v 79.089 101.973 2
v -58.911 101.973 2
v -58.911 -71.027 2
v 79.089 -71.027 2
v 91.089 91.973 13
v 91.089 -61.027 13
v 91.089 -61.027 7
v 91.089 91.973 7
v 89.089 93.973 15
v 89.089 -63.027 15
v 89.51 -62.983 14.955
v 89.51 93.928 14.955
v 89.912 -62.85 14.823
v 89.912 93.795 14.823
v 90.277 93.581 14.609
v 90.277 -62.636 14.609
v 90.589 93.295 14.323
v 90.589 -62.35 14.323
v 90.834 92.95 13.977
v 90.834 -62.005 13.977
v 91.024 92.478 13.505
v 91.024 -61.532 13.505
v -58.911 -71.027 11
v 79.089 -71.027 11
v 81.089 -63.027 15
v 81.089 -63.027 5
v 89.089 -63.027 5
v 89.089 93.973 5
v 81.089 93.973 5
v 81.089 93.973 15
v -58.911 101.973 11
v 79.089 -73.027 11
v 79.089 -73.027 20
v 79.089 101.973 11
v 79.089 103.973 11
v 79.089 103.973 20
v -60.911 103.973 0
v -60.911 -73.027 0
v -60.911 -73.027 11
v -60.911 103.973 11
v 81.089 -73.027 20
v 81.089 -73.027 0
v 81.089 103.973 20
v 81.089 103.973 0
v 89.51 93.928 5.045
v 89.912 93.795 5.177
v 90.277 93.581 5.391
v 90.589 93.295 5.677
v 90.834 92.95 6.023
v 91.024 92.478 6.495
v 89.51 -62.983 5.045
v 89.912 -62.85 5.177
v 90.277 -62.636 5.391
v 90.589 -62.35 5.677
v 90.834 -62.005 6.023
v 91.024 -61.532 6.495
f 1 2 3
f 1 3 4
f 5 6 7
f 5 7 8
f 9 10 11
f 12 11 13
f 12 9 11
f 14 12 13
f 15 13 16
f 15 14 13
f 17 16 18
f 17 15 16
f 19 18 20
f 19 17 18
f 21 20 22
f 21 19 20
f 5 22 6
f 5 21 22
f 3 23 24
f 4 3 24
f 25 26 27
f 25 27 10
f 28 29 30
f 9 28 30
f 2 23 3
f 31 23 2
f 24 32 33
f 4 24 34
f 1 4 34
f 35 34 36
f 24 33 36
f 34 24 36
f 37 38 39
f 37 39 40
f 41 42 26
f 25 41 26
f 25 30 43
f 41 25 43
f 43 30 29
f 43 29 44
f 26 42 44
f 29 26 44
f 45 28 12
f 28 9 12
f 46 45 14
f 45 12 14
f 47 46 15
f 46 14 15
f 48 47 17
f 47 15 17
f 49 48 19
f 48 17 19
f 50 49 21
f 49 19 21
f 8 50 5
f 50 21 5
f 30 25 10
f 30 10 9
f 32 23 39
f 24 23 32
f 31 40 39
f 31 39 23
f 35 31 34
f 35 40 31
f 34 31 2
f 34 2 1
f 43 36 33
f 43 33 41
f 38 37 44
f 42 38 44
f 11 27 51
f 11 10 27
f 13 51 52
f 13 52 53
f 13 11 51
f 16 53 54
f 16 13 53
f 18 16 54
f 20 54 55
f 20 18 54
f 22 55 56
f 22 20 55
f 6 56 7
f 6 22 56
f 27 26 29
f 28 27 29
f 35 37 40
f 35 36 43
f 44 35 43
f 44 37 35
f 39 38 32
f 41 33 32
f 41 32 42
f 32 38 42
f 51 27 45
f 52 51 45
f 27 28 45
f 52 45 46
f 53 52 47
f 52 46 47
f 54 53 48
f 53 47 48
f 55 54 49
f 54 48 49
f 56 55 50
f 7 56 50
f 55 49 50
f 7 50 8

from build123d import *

# Parameters (mm, degrees)
F0_W     = 142
F0_H     = 177
F1_DEPTH = 20
F2_W     = 138
F2_H     = 173
F3_DEPTH = 18
F4_DEPTH = 9
F5_W     = 157
F5_H     = 10
F6_DEPTH = 10
F7_R     = 2


with BuildPart() as f1:
    # F0 (on Top) → F1 (new body)
    with BuildSketch(Plane.XY):
        with Locations((10.088578, 15.472607)):
            Rectangle(F0_W, F0_H)
    extrude(amount=F1_DEPTH)

    # F2 (on face) → F3 (cut)
    with BuildSketch(Plane.XY.offset(20)):
        with Locations((10.088578, 15.472607)):
            Rectangle(F2_W, F2_H)
    extrude(amount=-F3_DEPTH, mode=Mode.SUBTRACT)

    # F2 (on face) → F4 (cut)
    with BuildSketch(Plane.XY.offset(20)):
        Polygon((-60.911422, -73.027393), (79.088578, -73.027393), (79.088578, -71.027393), (-58.911422, -71.027393), (-58.911422, 101.972607), (79.088578, 101.972607), (79.088578, 103.972607), (-60.911422, 103.972607), align=None)
    extrude(amount=-F4_DEPTH, mode=Mode.SUBTRACT)

    # F5 (on face) → F6 (join)
    with BuildSketch(Plane.YZ.offset(81.088578)):
        with Locations((15.472607, 10)):
            Rectangle(F5_W, F5_H)
    extrude(amount=F6_DEPTH)

    # F7
    f7_edges = [f1.edges().sort_by_distance(p)[0] for p in [
        (91.088578, 15.472607, 15),
        (91.088578, 15.472607, 5),
        (91.088578, -63.027393, 10),
        (91.088578, 93.972607, 10),
    ]]
    fillet(f7_edges, radius=F7_R)


solid = f1.part
